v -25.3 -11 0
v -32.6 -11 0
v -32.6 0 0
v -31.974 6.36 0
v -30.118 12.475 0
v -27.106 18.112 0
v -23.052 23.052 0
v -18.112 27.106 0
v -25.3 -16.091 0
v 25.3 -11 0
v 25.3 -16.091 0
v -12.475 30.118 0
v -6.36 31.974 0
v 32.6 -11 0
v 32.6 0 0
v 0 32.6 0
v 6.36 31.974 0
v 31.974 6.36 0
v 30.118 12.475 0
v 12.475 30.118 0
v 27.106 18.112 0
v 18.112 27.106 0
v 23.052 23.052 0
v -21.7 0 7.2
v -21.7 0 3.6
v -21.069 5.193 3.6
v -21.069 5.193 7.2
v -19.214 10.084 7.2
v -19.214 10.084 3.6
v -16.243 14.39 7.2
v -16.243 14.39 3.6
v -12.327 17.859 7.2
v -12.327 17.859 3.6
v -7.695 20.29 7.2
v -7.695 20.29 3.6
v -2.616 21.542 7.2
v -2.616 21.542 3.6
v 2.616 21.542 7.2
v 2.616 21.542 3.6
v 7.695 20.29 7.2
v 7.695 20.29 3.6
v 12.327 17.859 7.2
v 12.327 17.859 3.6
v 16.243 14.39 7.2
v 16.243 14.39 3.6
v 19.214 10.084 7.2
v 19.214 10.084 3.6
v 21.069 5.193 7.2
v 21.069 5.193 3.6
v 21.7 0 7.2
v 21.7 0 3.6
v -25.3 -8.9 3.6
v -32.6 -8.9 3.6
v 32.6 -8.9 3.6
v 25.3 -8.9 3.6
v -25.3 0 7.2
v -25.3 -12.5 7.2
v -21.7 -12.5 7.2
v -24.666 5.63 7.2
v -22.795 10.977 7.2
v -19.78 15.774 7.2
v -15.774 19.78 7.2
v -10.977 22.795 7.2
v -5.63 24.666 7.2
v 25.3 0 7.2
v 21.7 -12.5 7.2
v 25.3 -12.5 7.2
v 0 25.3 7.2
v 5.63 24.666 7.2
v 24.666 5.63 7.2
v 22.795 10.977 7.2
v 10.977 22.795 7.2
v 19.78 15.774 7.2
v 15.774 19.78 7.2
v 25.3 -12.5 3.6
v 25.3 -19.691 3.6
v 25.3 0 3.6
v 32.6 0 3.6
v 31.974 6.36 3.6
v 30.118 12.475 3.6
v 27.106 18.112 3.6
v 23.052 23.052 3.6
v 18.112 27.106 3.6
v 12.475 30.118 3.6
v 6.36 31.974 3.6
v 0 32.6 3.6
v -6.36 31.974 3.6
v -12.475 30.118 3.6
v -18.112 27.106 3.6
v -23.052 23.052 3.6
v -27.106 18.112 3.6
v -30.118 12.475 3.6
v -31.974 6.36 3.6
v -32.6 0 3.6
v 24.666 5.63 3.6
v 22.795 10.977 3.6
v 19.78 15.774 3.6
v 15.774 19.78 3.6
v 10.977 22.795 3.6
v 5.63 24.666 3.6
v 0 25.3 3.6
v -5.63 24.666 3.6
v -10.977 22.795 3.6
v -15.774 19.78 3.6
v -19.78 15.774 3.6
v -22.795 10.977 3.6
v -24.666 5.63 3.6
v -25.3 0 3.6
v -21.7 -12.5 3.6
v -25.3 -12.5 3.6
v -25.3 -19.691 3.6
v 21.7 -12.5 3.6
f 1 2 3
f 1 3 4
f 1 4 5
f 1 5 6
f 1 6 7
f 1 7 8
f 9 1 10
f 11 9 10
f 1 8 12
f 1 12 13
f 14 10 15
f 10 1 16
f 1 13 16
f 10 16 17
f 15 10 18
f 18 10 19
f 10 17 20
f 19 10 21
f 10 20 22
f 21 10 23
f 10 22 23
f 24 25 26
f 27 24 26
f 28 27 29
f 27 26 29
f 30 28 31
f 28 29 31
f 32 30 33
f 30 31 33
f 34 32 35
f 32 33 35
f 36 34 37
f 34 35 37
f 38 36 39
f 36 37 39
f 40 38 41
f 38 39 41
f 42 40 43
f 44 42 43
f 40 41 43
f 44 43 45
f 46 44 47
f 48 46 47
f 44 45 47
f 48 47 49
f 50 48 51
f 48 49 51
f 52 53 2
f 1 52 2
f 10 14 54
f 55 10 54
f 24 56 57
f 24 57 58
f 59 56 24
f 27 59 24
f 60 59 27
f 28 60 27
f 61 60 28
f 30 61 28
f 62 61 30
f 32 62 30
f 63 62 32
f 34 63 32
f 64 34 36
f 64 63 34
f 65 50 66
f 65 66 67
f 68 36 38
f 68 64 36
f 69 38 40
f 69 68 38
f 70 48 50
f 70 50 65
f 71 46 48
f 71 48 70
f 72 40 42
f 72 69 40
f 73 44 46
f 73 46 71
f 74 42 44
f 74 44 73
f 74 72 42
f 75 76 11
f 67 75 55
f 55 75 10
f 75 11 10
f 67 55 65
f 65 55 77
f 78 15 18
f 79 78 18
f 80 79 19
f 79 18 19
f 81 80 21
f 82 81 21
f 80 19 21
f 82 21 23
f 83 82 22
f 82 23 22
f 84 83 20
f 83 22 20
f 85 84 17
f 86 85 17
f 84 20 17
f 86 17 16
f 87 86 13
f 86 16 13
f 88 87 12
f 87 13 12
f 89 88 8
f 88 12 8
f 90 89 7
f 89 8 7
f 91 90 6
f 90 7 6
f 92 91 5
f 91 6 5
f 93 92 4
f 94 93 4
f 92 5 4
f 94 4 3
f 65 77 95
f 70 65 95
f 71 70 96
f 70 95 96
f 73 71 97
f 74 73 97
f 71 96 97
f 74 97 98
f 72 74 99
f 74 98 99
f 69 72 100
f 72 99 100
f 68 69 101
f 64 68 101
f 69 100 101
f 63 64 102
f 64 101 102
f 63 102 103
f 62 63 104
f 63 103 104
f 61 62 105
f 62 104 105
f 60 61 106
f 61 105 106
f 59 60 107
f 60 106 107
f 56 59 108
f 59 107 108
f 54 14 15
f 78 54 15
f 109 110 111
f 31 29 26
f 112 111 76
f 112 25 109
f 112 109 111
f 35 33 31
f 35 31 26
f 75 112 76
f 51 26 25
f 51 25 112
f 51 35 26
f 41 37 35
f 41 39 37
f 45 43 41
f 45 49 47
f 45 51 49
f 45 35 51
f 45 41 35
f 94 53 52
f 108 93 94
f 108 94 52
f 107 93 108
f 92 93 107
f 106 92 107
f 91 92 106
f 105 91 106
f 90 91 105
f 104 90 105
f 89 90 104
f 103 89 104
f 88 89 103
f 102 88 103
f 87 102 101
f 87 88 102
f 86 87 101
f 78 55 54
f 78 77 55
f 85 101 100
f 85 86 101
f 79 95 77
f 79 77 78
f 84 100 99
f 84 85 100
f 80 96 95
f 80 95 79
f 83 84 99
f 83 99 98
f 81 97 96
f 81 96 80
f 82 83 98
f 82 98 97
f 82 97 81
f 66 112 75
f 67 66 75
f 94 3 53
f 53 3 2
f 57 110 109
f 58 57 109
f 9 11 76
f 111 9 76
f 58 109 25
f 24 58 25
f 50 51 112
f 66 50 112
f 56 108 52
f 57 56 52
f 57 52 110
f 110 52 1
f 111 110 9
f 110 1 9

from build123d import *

# Parameters (mm, degrees)
F1_DEPTH = 3.6
F3_DEPTH = 7.3
F5_DEPTH = 7.3
F7_DEPTH = 3.6
F9_DEPTH = 57.901


with BuildPart() as f1:
    # F0 (on Top) → F1 (new body)
    with BuildSketch(Plane.XY):
        with BuildLine():
            Line((-32.6, 0), (-32.6, -11))
            Line((-32.6, -11), (-25.3, -11))
            Line((-25.3, -11), (-25.3, -21))
            Line((-25.3, -21), (25.3, -21))
            Line((25.3, -21), (25.3, -11))
            Line((25.3, -11), (32.6, -11))
            Line((32.6, -11), (32.6, 0))
            ThreePointArc((32.6, 0), (0, 32.6), (-32.6, 0))
        make_face()
    extrude(amount=F1_DEPTH)

    # F2 (on face) → F3 (cut, through all)
    with BuildSketch(Plane.YZ.offset(32.6)):
        Polygon((-8.9, 3.6), (-11, 3.6), (-11, 0), align=None)
    extrude(amount=-F3_DEPTH, mode=Mode.SUBTRACT)

    # F4 (on face) → F5 (cut, through all)
    with BuildSketch(Plane(origin=(-32.6, 0, 0), x_dir=(0, -1, 0), z_dir=(-1, 0, 0))):
        Polygon((11, 0), (11, 3.6), (8.9, 3.6), align=None)
    extrude(amount=-F5_DEPTH, mode=Mode.SUBTRACT)

    # F6 (on face) → F7 (join)
    with BuildSketch(Plane.XY.offset(3.6)):
        with BuildLine():
            Line((-25.3, 0), (-25.3, -12.5))
            Line((-25.3, -12.5), (-21.7, -12.5))
            Line((-21.7, -12.5), (-21.7, 0))
            ThreePointArc((-21.7, 0), (0, 21.7), (21.7, 0))
            Line((21.7, 0), (21.7, -12.5))
            Line((21.7, -12.5), (25.3, -12.5))
            Line((25.3, -12.5), (25.3, 0))
            ThreePointArc((25.3, 0), (0, 25.3), (-25.3, 0))
        make_face()
    extrude(amount=F7_DEPTH)

    # F8 (on face) → F9 (cut, through all)
    with BuildSketch(Plane.YZ.offset(25.3)):
        Polygon((-19.691169, 3.6), (-21, 3.6), (-21, 0), (-16.091169, 0), align=None)
    extrude(amount=-F9_DEPTH, mode=Mode.SUBTRACT)


solid = f1.part
